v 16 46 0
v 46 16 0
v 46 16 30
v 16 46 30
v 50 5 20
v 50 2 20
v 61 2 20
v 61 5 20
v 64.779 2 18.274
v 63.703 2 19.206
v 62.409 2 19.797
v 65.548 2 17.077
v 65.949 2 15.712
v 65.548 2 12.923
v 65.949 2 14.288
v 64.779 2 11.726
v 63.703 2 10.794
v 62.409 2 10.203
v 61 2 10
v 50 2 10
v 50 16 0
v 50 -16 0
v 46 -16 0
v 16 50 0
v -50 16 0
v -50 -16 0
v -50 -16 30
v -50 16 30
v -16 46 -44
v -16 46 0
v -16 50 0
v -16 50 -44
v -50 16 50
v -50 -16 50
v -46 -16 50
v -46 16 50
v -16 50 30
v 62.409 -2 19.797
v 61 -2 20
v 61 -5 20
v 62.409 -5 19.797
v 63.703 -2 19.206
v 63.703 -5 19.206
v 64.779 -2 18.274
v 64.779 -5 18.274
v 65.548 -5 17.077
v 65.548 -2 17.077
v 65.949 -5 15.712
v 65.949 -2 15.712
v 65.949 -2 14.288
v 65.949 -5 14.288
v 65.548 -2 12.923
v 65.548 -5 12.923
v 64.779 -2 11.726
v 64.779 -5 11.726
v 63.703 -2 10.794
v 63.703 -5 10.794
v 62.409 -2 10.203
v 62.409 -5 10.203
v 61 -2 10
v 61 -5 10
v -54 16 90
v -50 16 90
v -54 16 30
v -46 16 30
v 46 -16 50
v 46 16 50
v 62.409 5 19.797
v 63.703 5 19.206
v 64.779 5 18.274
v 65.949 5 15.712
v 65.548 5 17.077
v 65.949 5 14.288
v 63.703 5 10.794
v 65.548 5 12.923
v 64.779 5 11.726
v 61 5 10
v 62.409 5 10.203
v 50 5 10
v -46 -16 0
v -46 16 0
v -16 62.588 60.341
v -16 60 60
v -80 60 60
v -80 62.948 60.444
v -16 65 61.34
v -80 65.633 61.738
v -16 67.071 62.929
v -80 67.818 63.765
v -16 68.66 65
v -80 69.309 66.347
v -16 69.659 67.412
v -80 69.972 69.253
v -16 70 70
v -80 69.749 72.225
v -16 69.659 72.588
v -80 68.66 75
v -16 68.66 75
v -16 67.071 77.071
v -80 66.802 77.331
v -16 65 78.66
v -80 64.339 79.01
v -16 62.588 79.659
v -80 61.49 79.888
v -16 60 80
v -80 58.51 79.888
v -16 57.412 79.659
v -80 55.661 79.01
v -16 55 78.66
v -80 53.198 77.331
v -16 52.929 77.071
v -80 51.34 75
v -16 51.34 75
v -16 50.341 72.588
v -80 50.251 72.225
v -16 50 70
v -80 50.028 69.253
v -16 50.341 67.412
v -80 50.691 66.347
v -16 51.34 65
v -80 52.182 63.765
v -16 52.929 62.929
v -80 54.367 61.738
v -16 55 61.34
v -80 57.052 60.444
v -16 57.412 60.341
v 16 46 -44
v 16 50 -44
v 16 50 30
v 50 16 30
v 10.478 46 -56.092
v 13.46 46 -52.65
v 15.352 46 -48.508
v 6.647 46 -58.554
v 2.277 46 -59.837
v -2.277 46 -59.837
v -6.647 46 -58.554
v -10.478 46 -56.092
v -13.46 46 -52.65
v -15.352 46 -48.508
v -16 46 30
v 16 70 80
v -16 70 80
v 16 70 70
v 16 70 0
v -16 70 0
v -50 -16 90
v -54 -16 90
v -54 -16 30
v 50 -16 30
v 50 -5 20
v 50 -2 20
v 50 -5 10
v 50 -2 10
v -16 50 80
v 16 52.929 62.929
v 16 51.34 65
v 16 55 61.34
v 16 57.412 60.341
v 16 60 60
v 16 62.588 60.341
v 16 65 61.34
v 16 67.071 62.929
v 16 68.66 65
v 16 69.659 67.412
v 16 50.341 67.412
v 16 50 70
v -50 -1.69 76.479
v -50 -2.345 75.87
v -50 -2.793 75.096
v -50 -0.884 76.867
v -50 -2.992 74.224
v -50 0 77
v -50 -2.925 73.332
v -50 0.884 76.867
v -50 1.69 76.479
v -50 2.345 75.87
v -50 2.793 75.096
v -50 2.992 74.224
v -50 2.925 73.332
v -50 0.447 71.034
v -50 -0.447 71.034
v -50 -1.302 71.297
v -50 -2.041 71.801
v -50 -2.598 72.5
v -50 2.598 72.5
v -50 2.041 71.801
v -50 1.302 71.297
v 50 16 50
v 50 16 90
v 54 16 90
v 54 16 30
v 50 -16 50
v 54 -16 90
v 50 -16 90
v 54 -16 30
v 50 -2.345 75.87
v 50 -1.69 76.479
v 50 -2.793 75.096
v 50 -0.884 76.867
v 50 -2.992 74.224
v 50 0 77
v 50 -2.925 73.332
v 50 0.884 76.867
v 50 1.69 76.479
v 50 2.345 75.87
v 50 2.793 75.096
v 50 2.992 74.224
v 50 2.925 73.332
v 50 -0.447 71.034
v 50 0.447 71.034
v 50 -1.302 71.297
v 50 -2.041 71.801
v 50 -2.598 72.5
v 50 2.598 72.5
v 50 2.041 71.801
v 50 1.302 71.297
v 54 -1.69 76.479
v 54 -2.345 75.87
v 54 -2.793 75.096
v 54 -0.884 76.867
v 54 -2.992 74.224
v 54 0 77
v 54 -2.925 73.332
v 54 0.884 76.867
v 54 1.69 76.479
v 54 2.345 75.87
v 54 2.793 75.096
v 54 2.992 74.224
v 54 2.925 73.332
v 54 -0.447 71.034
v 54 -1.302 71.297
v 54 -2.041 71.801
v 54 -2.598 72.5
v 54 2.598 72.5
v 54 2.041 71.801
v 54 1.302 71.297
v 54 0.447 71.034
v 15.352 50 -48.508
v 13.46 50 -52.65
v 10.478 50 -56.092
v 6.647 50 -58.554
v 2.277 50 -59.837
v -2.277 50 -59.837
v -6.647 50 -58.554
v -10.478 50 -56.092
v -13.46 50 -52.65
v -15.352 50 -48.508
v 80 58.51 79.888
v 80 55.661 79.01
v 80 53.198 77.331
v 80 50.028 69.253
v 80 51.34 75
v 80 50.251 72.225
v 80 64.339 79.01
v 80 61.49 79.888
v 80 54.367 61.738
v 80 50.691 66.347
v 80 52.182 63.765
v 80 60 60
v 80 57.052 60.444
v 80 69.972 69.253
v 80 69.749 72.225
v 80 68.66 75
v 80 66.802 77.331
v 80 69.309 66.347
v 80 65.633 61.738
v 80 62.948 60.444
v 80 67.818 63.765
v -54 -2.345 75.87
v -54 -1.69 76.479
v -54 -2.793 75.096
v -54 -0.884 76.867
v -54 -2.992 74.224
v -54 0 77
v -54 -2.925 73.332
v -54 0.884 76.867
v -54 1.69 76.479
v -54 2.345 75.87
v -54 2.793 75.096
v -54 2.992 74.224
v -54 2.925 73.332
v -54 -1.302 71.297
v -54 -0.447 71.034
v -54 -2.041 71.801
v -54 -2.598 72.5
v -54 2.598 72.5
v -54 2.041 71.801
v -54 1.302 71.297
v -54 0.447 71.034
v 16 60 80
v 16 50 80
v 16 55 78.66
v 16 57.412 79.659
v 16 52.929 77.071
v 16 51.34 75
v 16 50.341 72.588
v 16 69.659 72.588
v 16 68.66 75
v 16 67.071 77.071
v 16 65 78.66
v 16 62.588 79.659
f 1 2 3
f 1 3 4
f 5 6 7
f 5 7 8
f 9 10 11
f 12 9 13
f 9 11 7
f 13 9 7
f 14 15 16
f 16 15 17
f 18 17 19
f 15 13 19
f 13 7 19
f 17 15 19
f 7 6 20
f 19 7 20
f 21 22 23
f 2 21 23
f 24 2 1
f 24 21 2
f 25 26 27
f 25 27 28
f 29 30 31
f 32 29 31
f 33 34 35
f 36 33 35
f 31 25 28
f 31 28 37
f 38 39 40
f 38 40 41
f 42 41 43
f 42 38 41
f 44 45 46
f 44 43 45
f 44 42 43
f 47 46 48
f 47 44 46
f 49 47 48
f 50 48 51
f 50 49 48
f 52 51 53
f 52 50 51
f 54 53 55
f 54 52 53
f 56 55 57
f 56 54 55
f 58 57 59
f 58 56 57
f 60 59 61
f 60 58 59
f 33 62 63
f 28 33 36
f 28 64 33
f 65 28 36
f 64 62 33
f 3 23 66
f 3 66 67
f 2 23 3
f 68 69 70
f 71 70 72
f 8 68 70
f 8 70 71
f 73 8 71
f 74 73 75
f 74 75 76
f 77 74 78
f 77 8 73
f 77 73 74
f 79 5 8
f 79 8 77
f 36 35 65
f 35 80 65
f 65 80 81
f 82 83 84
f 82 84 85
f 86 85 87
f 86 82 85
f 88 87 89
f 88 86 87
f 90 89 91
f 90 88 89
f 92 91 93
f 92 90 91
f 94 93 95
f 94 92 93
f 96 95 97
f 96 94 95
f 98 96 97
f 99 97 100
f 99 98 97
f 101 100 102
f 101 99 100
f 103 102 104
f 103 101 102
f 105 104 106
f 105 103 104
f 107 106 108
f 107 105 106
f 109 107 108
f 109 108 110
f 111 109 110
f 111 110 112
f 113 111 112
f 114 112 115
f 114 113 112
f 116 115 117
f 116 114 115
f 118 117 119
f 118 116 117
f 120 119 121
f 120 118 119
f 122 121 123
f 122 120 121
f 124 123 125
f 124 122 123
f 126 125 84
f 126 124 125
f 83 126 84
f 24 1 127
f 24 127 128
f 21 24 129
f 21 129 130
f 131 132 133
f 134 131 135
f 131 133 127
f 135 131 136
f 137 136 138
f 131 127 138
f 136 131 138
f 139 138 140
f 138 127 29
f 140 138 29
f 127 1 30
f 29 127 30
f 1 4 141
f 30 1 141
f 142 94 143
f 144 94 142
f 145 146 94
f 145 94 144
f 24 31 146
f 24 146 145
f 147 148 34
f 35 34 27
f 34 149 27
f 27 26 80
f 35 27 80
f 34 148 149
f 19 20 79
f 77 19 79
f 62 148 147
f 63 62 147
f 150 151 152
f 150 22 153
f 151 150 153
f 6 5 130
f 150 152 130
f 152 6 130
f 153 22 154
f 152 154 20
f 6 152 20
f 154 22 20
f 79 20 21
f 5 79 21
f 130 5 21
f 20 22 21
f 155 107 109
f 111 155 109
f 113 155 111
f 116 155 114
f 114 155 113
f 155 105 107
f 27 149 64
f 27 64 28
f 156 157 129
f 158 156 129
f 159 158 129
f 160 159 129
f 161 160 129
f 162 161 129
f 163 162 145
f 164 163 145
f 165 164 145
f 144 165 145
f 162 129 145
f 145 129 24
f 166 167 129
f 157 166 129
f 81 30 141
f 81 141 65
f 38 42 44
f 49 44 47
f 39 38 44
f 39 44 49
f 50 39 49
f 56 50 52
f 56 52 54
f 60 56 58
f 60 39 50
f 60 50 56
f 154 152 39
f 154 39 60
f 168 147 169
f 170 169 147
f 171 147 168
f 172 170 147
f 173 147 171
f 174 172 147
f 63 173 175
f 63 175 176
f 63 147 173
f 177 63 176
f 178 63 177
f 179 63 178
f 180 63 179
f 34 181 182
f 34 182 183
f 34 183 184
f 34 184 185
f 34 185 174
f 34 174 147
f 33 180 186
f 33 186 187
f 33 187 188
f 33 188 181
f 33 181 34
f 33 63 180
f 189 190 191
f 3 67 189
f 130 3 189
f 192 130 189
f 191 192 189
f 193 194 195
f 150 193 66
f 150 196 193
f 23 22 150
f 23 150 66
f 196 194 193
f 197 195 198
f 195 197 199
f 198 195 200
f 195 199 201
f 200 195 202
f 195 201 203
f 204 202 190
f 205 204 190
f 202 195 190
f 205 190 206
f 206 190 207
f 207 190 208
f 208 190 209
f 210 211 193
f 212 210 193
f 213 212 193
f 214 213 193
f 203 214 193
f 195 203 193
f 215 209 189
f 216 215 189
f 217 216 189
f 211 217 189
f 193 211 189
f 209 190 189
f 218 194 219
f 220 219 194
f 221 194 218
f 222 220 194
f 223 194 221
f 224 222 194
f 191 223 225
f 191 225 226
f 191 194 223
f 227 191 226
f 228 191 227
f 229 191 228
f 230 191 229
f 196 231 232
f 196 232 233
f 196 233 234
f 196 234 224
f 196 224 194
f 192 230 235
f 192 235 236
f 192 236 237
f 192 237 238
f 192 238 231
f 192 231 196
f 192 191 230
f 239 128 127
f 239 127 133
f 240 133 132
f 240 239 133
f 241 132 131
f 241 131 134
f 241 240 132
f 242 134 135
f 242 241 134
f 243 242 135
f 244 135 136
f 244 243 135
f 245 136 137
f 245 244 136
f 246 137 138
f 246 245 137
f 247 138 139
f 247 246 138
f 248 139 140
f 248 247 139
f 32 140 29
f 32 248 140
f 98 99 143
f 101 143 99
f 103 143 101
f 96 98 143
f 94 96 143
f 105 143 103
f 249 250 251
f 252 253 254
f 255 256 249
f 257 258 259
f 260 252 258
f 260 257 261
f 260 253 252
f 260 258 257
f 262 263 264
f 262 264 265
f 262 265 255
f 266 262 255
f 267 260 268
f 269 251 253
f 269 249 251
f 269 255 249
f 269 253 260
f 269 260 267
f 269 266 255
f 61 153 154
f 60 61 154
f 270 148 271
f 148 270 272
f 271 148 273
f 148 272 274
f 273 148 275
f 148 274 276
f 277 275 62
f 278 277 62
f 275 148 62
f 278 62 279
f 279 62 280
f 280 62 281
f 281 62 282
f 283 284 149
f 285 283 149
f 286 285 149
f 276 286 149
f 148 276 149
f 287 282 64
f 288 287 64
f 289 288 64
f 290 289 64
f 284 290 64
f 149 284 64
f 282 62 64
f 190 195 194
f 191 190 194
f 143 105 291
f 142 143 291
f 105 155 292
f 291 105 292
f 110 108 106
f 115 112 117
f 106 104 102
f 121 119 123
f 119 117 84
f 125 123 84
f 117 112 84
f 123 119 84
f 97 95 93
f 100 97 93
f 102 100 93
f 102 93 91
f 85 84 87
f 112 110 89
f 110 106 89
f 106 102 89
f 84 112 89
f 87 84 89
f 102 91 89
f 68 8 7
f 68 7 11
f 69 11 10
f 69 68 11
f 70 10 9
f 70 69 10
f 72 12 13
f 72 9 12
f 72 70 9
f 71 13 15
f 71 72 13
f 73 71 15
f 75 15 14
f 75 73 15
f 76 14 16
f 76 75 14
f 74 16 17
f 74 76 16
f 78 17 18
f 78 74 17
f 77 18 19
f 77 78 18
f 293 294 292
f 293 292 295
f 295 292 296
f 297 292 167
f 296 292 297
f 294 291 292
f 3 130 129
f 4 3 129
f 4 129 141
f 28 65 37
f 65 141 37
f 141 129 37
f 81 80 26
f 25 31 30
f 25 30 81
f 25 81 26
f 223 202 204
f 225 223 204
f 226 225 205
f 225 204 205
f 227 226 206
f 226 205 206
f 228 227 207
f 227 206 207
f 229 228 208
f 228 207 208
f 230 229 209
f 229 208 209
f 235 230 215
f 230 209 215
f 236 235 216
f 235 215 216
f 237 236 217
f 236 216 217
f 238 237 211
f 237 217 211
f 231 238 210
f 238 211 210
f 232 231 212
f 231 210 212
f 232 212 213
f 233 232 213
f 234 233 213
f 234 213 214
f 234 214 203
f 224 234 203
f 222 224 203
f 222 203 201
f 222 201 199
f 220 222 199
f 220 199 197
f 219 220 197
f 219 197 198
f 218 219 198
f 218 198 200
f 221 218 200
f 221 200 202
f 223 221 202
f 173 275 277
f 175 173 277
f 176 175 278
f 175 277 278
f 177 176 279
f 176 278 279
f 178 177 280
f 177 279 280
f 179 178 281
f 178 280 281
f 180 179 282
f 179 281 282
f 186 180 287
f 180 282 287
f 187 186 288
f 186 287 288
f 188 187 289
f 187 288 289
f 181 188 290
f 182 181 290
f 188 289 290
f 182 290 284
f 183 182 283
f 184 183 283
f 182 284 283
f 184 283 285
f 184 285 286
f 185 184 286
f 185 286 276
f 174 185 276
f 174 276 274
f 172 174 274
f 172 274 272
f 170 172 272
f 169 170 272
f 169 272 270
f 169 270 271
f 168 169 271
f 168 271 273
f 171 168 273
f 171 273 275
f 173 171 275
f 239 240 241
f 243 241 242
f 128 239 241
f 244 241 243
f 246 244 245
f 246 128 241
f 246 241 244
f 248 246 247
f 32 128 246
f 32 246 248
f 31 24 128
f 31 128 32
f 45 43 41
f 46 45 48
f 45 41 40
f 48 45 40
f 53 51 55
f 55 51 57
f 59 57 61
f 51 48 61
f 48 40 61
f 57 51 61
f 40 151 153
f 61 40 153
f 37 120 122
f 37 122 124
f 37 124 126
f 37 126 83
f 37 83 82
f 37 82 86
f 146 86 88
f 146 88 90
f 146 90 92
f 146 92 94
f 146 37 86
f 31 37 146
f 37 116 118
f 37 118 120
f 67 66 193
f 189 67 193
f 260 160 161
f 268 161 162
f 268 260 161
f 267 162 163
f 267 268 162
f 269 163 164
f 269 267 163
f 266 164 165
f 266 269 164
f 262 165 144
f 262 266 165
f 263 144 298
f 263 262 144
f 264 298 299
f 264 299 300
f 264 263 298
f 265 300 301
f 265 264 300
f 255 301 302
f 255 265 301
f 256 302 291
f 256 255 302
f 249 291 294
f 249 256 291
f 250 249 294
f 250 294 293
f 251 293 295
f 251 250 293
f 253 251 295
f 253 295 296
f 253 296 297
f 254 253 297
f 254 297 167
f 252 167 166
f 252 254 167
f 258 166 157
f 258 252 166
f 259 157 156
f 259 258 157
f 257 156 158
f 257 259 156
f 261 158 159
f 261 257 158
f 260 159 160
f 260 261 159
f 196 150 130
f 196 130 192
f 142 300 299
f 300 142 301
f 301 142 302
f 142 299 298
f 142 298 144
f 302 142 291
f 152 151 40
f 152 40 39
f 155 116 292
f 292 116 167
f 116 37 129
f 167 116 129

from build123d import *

# Parameters (mm, degrees)
EXTRUDE_1_DEPTH     = 30
SKETCH_2_W          = 32
SKETCH_2_H          = 4
EXTRUDE_2_DEPTH     = 60
CUT_EXTRUDE_1_DEPTH = 30
SKETCH_6_W          = 4
SKETCH_6_H          = 32
EXTRUDE_4_DEPTH     = 20
SKETCH_7_W          = 4
SKETCH_7_H          = 60
EXTRUDE_5_DEPTH     = 32
SKETCH_8_R          = 3
CUT_EXTRUDE_3_DEPTH = 109
SKETCH_9_W          = 32
SKETCH_9_H          = 80
EXTRUDE_6_DEPTH     = 20
SKETCH_10_R         = 10
EXTRUDE_7_DEPTH     = 80
SKETCH_11_W         = 10
SKETCH_11_H         = 3
EXTRUDE_8_DEPTH     = 16
CUT_EXTRUDE_4_DEPTH = 16


with BuildPart() as part:
    # 草图1 → 凸台-拉伸1 (new body)
    with BuildSketch(Plane.XY):
        Polygon((-50, 16), (-16, 50), (16, 50), (50, 16), (50, -16), (46, -16), (46, 16), (16, 46), (-16, 46), (-46, 16), (-46, -16), (-50, -16), align=None)
    extrude(amount=EXTRUDE_1_DEPTH)

    # 草图2 → 凸台-拉伸2 (add)
    with BuildSketch(Plane(origin=(0, 0, 0), x_dir=(-1, 0, 0), z_dir=(0, 0, -1))):
        with Locations((0, 48)):
            Rectangle(SKETCH_2_W, SKETCH_2_H)
    extrude(amount=EXTRUDE_2_DEPTH)

    # 草图3 → 切除-拉伸1 (cut)
    with BuildSketch(Plane(origin=(0, 50, 0), x_dir=(1, 0, 0), z_dir=(0, 1, 0))):
        with BuildLine():
            Line((-16, 44), (-16, 67.226604698))
            Line((-16, 67.226604698), (16, 67.226604698))
            Line((16, 67.226604698), (16, 44))
            ThreePointArc((16, 44), (0, 60), (-16, 44))
        make_face()
    extrude(amount=-CUT_EXTRUDE_1_DEPTH, mode=Mode.SUBTRACT)

    # 草图6 → 凸台-拉伸4 (add)
    with BuildSketch(Plane.XY.offset(30)):
        with Locations((-48, 0)):
            Rectangle(SKETCH_6_W, SKETCH_6_H)
        with Locations((48, 0)):
            Rectangle(SKETCH_6_W, SKETCH_6_H)
    extrude(amount=EXTRUDE_4_DEPTH)

    # 草图7 → 凸台-拉伸5 (add)
    with BuildSketch(Plane(origin=(0, 16, 0), x_dir=(1, 0, 0), z_dir=(0, 1, 0))):
        with Locations((-52, -60)):
            Rectangle(SKETCH_7_W, SKETCH_7_H)
        with Locations((52, -60)):
            Rectangle(SKETCH_7_W, SKETCH_7_H)
    extrude(amount=-EXTRUDE_5_DEPTH)

    # 草图8 → 切除-拉伸3 (cut, through all)
    with BuildSketch(Plane.ZY.offset(54)):
        with Locations((74, 0)):
            Circle(SKETCH_8_R)
    extrude(amount=-CUT_EXTRUDE_3_DEPTH, mode=Mode.SUBTRACT)

    # 草图9 → 凸台-拉伸6 (add)
    with BuildSketch(Plane(origin=(0, 50, 0), x_dir=(1, 0, 0), z_dir=(0, 1, 0))):
        with Locations((0, -40)):
            Rectangle(SKETCH_9_W, SKETCH_9_H)
    extrude(amount=EXTRUDE_6_DEPTH)

    # 草图10 → 凸台-拉伸7 (add, symmetric)
    with BuildSketch(Plane(origin=(0, 0, 0), x_dir=(0, 0, -1), z_dir=(1, 0, 0))):
        with Locations((-70, 60)):
            Circle(SKETCH_10_R)
    extrude(amount=EXTRUDE_7_DEPTH, both=True)

    # 草图11 → 凸台-拉伸8 (add)
    with BuildSketch(Plane(origin=(50, 0, 0), x_dir=(0, 0, -1), z_dir=(1, 0, 0))):
        with Locations((-15, -3.5)):
            Rectangle(SKETCH_11_W, SKETCH_11_H)
        with Locations((-15, 3.5)):
            Rectangle(SKETCH_11_W, SKETCH_11_H)
    extrude(amount=EXTRUDE_8_DEPTH)

    # 草图12 → 切除-拉伸4 (cut)
    with BuildSketch(Plane(origin=(0, 5, 0), x_dir=(1, 0, 0), z_dir=(0, 1, 0))):
        with BuildLine():
            Line((61, -10), (68.714035349, -10))
            Line((68.714035349, -10), (68.714035349, -20))
            Line((68.714035349, -20), (61, -20))
            ThreePointArc((61, -20), (66, -15), (61, -10))
        make_face()
    extrude(amount=-CUT_EXTRUDE_4_DEPTH, mode=Mode.SUBTRACT)


solid = part.part
